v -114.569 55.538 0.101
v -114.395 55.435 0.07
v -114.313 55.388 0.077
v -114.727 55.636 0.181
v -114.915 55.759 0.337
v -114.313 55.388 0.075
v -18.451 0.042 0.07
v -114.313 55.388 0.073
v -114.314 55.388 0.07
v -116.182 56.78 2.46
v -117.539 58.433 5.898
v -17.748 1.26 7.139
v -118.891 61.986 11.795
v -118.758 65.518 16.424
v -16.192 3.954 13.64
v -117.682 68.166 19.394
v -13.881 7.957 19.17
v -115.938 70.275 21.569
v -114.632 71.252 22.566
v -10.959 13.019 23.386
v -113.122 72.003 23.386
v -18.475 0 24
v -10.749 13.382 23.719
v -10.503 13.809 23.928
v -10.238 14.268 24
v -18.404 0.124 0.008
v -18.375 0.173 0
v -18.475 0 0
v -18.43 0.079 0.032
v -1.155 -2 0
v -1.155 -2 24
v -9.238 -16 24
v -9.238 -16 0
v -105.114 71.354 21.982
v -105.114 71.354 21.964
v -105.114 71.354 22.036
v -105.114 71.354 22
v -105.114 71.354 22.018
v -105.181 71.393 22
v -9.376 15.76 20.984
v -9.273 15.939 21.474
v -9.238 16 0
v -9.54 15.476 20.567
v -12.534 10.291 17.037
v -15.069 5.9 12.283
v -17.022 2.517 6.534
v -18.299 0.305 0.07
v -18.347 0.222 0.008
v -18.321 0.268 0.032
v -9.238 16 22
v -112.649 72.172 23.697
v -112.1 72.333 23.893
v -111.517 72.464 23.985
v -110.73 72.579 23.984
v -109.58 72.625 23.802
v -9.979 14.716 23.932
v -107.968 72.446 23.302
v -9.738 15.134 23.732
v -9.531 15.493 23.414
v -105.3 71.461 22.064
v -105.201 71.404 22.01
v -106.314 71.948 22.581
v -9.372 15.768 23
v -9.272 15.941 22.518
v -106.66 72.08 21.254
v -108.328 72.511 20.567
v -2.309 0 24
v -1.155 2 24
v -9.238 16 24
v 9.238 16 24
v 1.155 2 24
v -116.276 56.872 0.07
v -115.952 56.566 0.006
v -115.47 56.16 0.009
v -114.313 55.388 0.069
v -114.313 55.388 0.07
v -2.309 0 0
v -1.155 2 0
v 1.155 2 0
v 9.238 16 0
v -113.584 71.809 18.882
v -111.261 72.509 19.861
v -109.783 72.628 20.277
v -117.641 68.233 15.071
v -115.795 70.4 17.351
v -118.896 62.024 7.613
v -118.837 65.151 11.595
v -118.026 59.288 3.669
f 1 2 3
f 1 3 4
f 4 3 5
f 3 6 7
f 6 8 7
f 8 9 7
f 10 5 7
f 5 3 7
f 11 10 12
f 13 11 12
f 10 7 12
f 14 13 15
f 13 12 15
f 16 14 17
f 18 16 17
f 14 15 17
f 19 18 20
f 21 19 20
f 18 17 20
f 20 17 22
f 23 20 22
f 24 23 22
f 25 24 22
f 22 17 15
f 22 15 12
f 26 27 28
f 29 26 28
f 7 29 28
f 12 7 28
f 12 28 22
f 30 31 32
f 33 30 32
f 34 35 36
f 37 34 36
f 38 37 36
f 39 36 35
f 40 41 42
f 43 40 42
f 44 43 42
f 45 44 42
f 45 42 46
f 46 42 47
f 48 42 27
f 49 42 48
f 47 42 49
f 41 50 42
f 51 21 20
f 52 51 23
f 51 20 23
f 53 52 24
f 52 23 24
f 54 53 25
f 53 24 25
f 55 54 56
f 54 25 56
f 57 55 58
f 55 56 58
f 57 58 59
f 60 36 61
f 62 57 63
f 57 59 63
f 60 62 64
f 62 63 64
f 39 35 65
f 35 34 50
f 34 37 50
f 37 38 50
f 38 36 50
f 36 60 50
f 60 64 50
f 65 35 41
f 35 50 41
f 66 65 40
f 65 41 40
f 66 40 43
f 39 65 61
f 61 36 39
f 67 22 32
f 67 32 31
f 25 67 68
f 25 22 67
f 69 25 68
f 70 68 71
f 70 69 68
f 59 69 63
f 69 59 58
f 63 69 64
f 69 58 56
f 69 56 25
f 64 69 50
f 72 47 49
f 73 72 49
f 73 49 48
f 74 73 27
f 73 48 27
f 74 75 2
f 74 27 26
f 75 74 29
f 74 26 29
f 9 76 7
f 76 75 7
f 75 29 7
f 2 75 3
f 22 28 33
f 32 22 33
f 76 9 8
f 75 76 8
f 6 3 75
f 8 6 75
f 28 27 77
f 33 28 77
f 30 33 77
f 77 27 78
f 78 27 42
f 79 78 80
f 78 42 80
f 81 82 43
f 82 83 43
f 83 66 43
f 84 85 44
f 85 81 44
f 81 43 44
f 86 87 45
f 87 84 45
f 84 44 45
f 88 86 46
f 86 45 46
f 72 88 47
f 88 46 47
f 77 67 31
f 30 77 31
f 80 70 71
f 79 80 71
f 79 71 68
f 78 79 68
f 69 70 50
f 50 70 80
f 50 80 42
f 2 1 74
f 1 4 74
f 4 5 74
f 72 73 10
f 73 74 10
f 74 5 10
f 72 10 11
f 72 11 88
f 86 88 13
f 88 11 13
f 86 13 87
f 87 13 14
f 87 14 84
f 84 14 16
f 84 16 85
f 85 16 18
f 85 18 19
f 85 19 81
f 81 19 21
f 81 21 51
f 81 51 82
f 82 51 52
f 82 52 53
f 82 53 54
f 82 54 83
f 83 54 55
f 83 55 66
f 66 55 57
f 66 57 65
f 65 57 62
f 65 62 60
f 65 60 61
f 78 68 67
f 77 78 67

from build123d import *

# Parameters (mm, degrees)
Y_KSEKLIK_EKSTR_ZYON1_DEPTH = 24
Y_KSEKLIK_EKSTR_ZYON3_DEPTH = 120
KES_EKSTR_ZYON1_DEPTH       = 120
KES_EKSTR_ZYON2_DEPTH       = 120


with BuildPart() as part:
    # Çizim1 → Yükseklik-Ekstrüzyon1 (new body)
    with BuildSketch(Plane.XY):
        Polygon((18.475208614, 0), (9.237604307, 16), (-9.237604307, 16), (-18.475208614, 0), (-9.237604307, -16), (9.237604307, -16), align=None)
        Polygon((2.309401077, 0), (1.154700538, 2), (-1.154700538, 2), (-2.309401077, 0), (-1.154700538, -2), (1.154700538, -2), align=None, mode=Mode.SUBTRACT)
    extrude(amount=Y_KSEKLIK_EKSTR_ZYON1_DEPTH)

    # Çizim2 → Yükseklik-Ekstrüzyon3 (add)
    with BuildSketch(Plane(origin=(-13.856406461, 8, 0), x_dir=(0, 0, 1), z_dir=(-0.866025404, 0.5, 0))):
        with BuildLine():
            ThreePointArc((20.566689436, 8.632459435), (12.282851611, -2.425053991), (0.070057864, -8.885567992))
            ThreePointArc((0.070057864, -8.885567992), (0, -9.037604307), (0.070057864, -9.189640622))
            ThreePointArc((0.070057864, -9.189640622), (13.640166109, -4.672052834), (23.386017658, 5.795746113))
            ThreePointArc((23.386017658, 5.795746113), (23.418553761, 8.64746431), (20.566689436, 8.632459435))
        make_face()
    extrude(amount=Y_KSEKLIK_EKSTR_ZYON3_DEPTH)

    # Çizim4 → Kes-Ekstrüzyon1 (cut)
    with BuildSketch(Plane.XY.offset(24)):
        with BuildLine():
            Line((-105.114365337, 71.354096261), (-100.895998051, 78.520414233))
            Line((-100.895998051, 78.520414233), (-120.05269231, 81.506783127))
            Line((-120.05269231, 81.506783127), (-133.968493321, 62.353012073))
            Line((-133.968493321, 62.353012073), (-123.727089206, 47.811781803))
            Line((-123.727089206, 47.811781803), (-114.313260633, 55.388064385))
            ThreePointArc((-114.313260633, 55.388064385), (-117.77159569, 68.013605153), (-105.114365337, 71.354096261))
        make_face()
    extrude(amount=-KES_EKSTR_ZYON1_DEPTH, mode=Mode.SUBTRACT)

    # Çizim5 → Kes-Ekstrüzyon2 (cut)
    with BuildSketch(Plane.XY.offset(24)):
        Polygon((9.237604307, 16), (-9.237604307, -16), (-9.237604307, -28.740421499), (42.199790623, -28.740421499), (42.199790623, 12.667995961), align=None)
    extrude(amount=-KES_EKSTR_ZYON2_DEPTH, mode=Mode.SUBTRACT)


solid = part.part
